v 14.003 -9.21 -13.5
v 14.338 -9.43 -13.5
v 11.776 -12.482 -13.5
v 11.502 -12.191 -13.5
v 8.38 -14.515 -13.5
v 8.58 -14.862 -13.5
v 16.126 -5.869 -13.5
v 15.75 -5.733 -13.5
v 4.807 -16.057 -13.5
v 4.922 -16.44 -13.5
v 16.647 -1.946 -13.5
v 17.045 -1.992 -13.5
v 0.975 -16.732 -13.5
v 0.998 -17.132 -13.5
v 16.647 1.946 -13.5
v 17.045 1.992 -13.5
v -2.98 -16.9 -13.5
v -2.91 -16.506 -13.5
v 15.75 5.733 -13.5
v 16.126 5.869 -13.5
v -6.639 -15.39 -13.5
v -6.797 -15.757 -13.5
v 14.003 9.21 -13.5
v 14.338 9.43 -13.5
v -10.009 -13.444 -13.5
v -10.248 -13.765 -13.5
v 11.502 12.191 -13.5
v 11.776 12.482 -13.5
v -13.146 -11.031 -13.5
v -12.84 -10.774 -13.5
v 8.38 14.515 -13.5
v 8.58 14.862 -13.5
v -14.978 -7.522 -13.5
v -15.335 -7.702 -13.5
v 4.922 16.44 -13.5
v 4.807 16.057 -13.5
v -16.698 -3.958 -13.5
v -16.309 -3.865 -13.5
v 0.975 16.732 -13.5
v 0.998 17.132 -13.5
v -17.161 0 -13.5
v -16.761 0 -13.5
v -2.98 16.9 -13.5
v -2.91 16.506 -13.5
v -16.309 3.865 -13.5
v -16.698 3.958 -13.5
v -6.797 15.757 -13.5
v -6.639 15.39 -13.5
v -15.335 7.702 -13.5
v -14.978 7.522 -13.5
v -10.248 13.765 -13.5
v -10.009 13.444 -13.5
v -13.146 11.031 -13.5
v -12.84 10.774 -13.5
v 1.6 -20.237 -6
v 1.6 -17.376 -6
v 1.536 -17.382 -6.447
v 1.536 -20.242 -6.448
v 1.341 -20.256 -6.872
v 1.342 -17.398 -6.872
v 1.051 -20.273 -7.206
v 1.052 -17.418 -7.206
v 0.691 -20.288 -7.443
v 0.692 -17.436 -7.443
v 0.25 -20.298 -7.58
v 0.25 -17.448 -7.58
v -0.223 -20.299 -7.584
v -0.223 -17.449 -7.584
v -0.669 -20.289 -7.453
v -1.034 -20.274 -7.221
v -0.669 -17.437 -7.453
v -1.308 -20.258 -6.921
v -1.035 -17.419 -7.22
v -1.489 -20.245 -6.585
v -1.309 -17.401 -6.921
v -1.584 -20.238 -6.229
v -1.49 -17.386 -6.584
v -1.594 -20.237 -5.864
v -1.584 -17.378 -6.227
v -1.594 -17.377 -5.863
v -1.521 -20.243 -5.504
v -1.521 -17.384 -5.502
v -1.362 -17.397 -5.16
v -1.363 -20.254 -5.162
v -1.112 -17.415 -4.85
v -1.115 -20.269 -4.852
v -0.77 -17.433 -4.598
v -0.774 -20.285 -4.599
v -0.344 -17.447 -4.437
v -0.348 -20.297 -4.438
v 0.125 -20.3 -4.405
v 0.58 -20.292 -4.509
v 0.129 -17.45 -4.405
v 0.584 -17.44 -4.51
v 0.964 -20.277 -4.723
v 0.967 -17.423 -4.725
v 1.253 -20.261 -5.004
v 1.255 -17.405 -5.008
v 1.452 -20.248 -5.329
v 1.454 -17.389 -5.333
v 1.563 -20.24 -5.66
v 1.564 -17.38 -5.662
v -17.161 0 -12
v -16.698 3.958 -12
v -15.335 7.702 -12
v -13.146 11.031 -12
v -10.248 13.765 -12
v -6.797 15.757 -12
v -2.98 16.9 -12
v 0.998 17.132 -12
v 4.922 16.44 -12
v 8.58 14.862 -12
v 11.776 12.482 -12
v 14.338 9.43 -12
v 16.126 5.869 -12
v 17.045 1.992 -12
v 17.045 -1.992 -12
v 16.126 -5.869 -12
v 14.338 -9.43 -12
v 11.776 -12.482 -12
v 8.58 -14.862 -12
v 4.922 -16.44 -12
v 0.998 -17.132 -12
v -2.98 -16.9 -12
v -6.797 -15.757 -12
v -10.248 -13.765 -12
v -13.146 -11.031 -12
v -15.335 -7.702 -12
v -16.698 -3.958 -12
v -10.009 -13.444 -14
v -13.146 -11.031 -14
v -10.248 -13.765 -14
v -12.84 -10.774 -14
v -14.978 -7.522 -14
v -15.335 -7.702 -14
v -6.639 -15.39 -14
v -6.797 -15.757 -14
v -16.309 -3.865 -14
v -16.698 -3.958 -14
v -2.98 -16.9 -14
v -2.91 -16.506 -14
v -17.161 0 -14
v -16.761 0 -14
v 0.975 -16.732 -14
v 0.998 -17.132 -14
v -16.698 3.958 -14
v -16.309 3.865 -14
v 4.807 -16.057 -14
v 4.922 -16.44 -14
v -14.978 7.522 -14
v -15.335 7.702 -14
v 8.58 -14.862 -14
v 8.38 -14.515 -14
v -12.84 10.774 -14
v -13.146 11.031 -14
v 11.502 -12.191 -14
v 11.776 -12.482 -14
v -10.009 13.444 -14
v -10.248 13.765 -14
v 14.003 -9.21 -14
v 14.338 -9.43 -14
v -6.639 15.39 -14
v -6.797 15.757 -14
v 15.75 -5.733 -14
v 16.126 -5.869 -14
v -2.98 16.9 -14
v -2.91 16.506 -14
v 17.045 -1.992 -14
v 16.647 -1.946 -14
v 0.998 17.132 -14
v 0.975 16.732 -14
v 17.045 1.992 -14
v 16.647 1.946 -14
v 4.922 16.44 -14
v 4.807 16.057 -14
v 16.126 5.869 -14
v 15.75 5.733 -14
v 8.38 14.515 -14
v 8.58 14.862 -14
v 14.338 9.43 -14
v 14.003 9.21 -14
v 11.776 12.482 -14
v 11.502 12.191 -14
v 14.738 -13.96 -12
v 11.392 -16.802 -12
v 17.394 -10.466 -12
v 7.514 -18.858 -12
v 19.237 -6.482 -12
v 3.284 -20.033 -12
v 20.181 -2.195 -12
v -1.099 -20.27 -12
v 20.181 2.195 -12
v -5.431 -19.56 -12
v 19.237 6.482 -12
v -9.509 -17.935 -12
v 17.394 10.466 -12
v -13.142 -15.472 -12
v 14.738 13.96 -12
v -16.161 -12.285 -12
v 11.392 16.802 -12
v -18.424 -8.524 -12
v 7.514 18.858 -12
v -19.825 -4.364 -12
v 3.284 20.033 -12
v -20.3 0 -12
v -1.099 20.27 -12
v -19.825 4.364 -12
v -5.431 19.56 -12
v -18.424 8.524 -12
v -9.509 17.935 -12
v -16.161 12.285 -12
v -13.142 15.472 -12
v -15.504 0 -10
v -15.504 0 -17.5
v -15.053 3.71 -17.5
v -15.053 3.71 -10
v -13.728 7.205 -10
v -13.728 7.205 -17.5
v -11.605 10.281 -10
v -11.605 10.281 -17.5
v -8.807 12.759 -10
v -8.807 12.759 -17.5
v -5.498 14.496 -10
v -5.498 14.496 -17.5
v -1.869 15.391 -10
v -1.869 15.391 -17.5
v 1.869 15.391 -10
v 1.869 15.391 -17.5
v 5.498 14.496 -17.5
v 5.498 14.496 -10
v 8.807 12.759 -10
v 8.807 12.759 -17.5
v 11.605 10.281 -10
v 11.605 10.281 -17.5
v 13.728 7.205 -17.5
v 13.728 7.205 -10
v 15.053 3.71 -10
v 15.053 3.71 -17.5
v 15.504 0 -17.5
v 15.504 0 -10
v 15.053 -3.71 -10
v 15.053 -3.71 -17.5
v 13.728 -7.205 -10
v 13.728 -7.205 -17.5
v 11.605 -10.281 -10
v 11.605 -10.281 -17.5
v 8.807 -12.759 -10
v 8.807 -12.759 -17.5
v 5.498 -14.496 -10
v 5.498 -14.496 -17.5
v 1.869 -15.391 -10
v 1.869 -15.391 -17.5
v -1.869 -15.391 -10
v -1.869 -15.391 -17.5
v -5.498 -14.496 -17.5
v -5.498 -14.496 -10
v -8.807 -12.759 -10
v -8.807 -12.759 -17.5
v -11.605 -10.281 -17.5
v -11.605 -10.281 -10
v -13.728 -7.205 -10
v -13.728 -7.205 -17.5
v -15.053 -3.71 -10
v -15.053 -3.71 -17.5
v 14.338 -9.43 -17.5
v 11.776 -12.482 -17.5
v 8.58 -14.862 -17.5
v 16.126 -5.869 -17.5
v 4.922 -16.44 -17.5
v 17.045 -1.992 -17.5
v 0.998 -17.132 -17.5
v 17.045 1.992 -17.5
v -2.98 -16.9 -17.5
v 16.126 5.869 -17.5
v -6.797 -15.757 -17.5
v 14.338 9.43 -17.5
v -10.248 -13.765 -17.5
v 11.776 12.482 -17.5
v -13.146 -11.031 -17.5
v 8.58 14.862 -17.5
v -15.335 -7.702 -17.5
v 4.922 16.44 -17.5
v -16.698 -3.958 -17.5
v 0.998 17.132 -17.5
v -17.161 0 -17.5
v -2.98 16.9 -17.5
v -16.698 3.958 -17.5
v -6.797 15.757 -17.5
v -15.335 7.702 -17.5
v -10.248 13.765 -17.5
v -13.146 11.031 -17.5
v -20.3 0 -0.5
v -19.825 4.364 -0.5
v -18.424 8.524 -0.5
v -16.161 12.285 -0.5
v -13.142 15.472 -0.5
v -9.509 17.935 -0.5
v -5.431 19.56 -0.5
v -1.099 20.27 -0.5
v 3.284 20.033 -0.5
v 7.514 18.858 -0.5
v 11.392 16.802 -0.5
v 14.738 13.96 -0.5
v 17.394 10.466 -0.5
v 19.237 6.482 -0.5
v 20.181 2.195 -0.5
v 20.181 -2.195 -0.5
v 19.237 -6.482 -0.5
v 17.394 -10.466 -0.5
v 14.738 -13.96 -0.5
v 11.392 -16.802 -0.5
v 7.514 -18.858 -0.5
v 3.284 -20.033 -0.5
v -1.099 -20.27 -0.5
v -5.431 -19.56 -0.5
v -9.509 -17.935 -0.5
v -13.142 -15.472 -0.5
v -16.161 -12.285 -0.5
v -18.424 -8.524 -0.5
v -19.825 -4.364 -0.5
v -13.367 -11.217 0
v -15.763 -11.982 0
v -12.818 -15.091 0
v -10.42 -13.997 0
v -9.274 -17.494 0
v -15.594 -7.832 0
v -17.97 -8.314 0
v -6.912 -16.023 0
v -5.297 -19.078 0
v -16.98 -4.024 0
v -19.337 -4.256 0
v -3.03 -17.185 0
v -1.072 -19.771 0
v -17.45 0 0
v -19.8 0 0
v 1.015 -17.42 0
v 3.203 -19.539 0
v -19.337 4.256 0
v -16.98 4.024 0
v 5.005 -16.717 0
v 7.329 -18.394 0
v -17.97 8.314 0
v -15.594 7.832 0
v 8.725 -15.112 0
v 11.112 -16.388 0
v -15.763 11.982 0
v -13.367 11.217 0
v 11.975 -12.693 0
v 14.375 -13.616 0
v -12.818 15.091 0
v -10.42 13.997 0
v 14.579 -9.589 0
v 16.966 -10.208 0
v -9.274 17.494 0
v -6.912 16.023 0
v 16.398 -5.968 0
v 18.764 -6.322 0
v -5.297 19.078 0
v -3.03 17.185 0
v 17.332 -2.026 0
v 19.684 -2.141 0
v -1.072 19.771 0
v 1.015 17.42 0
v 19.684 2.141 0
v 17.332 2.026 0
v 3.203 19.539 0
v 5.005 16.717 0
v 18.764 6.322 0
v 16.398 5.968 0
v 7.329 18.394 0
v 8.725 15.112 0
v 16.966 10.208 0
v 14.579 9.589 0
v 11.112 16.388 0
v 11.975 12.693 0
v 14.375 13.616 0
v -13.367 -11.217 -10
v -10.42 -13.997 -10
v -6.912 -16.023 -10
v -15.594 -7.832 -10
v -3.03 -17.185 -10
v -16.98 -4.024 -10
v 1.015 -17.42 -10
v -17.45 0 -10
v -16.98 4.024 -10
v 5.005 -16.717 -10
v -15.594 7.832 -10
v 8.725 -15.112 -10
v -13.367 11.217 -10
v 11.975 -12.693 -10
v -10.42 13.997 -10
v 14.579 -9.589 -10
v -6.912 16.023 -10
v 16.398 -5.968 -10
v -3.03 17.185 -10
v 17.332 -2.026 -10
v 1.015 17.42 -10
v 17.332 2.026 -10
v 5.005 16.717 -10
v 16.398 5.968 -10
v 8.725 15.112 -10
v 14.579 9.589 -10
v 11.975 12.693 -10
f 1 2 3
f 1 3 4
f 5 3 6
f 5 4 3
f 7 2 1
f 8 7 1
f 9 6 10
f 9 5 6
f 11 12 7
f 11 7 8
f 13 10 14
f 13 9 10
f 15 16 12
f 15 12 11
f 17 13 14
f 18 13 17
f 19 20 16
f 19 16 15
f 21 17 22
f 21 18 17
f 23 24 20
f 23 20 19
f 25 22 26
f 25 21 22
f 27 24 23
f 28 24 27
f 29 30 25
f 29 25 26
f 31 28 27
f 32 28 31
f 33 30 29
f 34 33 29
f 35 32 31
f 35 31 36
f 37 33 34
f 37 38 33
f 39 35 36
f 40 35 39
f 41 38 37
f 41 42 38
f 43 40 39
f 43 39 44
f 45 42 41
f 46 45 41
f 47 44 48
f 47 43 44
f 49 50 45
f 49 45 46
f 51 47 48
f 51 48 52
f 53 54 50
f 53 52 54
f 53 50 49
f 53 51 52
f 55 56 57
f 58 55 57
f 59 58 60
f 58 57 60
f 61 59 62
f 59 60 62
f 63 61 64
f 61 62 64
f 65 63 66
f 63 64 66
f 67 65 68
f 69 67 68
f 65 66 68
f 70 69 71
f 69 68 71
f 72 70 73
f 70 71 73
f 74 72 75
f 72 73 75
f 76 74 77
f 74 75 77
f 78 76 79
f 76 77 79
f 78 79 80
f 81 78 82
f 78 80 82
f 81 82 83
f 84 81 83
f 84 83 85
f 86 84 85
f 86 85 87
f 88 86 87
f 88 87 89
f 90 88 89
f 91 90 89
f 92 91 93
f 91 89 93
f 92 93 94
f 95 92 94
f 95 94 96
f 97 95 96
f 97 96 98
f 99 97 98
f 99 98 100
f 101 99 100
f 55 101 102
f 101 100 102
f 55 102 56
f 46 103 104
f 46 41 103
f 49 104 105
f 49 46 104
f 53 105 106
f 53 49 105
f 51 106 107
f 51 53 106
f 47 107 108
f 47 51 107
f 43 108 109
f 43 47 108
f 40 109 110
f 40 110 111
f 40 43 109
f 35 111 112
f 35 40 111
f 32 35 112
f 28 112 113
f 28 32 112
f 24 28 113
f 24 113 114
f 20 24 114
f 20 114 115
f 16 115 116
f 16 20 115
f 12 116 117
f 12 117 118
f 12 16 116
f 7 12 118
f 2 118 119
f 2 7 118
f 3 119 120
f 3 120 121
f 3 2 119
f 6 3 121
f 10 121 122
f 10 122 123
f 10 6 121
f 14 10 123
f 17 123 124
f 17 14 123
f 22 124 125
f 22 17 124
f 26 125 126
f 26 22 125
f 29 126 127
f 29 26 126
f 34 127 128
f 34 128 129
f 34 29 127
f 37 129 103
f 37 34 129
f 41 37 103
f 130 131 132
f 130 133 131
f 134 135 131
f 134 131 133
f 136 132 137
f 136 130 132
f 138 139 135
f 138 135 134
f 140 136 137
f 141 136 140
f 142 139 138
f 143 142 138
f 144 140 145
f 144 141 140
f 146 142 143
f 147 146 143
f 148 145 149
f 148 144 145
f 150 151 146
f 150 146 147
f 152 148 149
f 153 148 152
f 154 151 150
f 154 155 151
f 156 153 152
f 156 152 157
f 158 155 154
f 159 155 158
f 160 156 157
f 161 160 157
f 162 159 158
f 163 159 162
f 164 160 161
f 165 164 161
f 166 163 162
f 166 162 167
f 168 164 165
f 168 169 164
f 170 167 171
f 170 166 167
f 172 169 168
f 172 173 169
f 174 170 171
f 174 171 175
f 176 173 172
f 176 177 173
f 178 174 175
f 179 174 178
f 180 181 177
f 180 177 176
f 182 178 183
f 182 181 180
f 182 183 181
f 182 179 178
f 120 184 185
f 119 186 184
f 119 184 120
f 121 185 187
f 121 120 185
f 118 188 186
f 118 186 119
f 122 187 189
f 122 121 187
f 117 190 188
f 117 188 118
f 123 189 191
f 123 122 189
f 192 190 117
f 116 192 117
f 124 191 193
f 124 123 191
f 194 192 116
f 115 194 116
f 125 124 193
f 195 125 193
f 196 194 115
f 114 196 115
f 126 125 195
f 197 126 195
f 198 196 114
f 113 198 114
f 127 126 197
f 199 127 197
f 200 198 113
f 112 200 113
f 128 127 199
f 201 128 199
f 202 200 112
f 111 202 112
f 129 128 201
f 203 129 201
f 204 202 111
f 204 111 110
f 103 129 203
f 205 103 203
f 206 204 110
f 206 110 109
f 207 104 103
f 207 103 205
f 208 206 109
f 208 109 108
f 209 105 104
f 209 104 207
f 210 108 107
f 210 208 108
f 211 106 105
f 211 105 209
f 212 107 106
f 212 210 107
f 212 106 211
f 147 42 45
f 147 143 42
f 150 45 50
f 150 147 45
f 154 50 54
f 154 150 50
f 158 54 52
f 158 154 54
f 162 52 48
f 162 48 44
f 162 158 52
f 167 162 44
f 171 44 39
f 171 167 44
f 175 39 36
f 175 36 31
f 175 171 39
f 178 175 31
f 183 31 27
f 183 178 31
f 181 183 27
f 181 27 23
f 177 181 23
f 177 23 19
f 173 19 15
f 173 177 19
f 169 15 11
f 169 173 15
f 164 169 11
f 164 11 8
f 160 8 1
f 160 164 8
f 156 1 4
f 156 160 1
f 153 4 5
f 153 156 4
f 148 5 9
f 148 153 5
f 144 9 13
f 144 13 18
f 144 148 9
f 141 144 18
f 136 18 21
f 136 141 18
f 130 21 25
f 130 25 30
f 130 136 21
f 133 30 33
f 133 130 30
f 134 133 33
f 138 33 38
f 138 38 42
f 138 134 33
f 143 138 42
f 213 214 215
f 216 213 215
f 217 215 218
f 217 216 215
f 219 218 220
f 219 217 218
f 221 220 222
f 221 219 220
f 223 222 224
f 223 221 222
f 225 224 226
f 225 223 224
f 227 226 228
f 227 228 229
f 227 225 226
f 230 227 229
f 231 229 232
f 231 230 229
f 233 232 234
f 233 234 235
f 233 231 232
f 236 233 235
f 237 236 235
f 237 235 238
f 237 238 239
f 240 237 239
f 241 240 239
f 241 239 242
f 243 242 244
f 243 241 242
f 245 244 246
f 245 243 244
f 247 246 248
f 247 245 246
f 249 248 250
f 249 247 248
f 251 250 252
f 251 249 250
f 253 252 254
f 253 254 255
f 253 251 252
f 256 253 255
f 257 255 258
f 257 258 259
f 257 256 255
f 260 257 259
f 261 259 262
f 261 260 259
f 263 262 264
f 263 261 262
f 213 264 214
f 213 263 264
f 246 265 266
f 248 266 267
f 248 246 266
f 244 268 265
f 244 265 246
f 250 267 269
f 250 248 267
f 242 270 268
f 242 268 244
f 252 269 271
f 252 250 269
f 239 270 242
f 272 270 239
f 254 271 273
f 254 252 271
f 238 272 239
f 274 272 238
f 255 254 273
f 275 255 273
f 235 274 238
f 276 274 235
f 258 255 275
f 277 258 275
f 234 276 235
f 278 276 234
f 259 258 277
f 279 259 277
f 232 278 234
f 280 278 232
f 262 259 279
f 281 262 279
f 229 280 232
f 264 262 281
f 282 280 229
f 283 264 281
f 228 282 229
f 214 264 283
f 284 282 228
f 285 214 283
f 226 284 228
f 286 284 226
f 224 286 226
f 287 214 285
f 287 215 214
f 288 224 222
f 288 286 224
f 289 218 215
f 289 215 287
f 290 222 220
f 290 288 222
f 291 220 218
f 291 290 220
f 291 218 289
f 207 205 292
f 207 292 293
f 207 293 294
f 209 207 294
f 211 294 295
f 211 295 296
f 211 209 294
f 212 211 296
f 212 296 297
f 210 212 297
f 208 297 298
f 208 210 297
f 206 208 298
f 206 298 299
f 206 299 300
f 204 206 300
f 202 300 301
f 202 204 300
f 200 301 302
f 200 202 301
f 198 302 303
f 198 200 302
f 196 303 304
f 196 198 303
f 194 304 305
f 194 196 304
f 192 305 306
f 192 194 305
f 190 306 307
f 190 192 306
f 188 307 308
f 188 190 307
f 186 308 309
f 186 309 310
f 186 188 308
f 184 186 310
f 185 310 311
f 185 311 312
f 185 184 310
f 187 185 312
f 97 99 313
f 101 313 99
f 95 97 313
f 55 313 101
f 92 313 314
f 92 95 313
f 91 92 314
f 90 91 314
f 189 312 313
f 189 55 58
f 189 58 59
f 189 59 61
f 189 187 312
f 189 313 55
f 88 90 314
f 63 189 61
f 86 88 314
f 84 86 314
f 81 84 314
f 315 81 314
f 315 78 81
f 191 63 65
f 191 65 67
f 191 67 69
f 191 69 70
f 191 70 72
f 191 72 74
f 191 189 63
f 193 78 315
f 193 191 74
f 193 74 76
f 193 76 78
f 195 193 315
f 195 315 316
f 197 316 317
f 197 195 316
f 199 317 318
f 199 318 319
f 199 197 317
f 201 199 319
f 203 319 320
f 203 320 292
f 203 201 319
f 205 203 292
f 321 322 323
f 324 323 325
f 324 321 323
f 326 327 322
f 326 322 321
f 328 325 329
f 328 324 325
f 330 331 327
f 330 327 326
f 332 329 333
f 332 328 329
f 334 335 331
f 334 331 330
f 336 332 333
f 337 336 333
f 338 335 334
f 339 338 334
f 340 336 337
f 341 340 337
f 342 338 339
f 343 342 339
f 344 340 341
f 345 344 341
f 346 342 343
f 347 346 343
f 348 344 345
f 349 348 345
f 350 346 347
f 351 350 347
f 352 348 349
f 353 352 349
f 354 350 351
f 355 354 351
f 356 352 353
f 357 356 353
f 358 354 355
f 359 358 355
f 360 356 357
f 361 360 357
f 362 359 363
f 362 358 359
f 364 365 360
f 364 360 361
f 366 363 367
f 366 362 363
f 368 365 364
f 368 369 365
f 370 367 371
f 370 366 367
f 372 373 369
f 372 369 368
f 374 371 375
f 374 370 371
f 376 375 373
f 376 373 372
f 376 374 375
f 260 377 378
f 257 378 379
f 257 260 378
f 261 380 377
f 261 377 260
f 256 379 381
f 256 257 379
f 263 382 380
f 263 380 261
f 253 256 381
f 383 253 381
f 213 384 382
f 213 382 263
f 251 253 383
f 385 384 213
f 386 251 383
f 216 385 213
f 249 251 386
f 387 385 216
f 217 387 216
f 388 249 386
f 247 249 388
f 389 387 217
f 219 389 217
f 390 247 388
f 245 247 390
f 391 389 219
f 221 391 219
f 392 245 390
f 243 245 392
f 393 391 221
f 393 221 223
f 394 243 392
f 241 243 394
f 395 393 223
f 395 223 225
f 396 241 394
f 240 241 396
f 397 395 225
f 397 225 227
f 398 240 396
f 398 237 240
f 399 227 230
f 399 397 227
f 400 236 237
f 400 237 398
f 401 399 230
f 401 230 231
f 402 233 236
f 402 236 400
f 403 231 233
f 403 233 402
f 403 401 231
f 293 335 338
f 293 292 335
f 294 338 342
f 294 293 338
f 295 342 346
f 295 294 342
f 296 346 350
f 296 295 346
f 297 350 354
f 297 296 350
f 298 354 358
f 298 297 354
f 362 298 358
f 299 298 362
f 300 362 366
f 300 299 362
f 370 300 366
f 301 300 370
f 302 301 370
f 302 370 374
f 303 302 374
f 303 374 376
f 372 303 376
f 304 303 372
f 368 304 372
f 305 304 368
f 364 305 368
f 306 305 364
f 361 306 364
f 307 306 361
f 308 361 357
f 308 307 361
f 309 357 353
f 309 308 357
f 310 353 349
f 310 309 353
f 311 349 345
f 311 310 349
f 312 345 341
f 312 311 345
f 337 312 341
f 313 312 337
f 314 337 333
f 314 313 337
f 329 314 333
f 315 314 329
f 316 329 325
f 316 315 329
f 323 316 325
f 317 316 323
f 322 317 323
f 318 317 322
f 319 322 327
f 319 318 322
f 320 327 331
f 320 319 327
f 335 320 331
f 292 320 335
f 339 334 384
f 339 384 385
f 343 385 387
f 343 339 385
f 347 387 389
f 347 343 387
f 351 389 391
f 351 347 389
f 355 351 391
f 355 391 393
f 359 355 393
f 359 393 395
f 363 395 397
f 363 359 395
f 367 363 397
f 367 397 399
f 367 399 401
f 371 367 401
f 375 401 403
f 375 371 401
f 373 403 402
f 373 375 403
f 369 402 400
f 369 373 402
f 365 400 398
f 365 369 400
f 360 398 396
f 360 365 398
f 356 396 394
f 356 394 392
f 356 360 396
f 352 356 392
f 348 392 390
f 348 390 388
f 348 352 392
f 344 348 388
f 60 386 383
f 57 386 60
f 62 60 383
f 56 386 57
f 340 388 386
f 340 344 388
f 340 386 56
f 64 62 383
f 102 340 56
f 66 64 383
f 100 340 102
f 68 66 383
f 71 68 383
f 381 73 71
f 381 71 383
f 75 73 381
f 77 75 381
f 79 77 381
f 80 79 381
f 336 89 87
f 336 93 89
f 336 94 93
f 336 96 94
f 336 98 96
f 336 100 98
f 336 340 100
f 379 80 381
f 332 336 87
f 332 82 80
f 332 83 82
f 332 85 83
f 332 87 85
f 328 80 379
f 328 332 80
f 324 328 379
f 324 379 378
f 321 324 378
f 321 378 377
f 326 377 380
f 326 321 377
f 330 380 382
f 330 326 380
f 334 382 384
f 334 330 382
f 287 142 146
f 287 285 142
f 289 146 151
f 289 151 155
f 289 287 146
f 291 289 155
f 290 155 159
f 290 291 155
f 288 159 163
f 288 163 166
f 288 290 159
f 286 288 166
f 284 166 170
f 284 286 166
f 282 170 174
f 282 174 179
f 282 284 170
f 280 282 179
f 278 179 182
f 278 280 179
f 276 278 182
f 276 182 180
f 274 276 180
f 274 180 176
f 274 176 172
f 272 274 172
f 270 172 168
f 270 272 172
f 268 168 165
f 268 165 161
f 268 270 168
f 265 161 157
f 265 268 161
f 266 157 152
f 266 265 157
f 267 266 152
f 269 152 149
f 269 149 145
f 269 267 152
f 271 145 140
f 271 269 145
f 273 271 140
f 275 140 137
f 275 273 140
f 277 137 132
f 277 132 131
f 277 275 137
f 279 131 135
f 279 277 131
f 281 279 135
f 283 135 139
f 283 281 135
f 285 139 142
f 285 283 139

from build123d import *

# Parameters (mm, degrees)
SKETCH2_R          = 1.6
CUT_EXTRUDE1_DEPTH = 25


with BuildPart() as part:
    # Sketch1 → Revolve1 (revolve)
    with BuildSketch(Plane(origin=(0, 0, 0), x_dir=(1, 0, 0), z_dir=(0, 1, 0))):
        Polygon((-17.45, 0), (-19.8, 0), (-20.3, 0.5), (-20.3, 12), (-17.160824742, 12), (-17.160824742, 13.5), (-16.760824742, 13.5), (-16.760824742, 14), (-17.160824742, 14), (-17.160824742, 17.5), (-15.50386168, 17.5), (-15.50386168, 10), (-17.45, 10), align=None)
    revolve(axis=Axis((0, 0, 0), (0, 0, -1)))

    # Sketch2 → Cut-Extrude1 (cut)
    with BuildSketch(Plane(origin=(0, 0, 0), x_dir=(1, 0, 0), z_dir=(0, 1, 0))):
        with Locations((0, 6)):
            Circle(SKETCH2_R)
    extrude(amount=-CUT_EXTRUDE1_DEPTH, mode=Mode.SUBTRACT)


solid = part.part
